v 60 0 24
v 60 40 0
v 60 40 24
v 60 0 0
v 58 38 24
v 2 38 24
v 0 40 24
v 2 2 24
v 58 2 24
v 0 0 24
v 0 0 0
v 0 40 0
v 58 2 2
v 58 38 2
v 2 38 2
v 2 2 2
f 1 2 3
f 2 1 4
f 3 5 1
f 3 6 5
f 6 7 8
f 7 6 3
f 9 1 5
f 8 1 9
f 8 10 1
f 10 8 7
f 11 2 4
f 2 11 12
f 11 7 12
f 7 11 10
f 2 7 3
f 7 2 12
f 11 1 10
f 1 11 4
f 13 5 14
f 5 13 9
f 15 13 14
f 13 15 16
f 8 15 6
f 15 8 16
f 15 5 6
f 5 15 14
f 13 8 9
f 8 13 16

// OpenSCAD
width = 60;
depth = 40;
height = 24;
wall = 2;

difference() {
  cube([width, depth, height]);
  translate([wall, wall, wall])
    cube([width - wall * 2, depth - wall * 2, height]);
}
